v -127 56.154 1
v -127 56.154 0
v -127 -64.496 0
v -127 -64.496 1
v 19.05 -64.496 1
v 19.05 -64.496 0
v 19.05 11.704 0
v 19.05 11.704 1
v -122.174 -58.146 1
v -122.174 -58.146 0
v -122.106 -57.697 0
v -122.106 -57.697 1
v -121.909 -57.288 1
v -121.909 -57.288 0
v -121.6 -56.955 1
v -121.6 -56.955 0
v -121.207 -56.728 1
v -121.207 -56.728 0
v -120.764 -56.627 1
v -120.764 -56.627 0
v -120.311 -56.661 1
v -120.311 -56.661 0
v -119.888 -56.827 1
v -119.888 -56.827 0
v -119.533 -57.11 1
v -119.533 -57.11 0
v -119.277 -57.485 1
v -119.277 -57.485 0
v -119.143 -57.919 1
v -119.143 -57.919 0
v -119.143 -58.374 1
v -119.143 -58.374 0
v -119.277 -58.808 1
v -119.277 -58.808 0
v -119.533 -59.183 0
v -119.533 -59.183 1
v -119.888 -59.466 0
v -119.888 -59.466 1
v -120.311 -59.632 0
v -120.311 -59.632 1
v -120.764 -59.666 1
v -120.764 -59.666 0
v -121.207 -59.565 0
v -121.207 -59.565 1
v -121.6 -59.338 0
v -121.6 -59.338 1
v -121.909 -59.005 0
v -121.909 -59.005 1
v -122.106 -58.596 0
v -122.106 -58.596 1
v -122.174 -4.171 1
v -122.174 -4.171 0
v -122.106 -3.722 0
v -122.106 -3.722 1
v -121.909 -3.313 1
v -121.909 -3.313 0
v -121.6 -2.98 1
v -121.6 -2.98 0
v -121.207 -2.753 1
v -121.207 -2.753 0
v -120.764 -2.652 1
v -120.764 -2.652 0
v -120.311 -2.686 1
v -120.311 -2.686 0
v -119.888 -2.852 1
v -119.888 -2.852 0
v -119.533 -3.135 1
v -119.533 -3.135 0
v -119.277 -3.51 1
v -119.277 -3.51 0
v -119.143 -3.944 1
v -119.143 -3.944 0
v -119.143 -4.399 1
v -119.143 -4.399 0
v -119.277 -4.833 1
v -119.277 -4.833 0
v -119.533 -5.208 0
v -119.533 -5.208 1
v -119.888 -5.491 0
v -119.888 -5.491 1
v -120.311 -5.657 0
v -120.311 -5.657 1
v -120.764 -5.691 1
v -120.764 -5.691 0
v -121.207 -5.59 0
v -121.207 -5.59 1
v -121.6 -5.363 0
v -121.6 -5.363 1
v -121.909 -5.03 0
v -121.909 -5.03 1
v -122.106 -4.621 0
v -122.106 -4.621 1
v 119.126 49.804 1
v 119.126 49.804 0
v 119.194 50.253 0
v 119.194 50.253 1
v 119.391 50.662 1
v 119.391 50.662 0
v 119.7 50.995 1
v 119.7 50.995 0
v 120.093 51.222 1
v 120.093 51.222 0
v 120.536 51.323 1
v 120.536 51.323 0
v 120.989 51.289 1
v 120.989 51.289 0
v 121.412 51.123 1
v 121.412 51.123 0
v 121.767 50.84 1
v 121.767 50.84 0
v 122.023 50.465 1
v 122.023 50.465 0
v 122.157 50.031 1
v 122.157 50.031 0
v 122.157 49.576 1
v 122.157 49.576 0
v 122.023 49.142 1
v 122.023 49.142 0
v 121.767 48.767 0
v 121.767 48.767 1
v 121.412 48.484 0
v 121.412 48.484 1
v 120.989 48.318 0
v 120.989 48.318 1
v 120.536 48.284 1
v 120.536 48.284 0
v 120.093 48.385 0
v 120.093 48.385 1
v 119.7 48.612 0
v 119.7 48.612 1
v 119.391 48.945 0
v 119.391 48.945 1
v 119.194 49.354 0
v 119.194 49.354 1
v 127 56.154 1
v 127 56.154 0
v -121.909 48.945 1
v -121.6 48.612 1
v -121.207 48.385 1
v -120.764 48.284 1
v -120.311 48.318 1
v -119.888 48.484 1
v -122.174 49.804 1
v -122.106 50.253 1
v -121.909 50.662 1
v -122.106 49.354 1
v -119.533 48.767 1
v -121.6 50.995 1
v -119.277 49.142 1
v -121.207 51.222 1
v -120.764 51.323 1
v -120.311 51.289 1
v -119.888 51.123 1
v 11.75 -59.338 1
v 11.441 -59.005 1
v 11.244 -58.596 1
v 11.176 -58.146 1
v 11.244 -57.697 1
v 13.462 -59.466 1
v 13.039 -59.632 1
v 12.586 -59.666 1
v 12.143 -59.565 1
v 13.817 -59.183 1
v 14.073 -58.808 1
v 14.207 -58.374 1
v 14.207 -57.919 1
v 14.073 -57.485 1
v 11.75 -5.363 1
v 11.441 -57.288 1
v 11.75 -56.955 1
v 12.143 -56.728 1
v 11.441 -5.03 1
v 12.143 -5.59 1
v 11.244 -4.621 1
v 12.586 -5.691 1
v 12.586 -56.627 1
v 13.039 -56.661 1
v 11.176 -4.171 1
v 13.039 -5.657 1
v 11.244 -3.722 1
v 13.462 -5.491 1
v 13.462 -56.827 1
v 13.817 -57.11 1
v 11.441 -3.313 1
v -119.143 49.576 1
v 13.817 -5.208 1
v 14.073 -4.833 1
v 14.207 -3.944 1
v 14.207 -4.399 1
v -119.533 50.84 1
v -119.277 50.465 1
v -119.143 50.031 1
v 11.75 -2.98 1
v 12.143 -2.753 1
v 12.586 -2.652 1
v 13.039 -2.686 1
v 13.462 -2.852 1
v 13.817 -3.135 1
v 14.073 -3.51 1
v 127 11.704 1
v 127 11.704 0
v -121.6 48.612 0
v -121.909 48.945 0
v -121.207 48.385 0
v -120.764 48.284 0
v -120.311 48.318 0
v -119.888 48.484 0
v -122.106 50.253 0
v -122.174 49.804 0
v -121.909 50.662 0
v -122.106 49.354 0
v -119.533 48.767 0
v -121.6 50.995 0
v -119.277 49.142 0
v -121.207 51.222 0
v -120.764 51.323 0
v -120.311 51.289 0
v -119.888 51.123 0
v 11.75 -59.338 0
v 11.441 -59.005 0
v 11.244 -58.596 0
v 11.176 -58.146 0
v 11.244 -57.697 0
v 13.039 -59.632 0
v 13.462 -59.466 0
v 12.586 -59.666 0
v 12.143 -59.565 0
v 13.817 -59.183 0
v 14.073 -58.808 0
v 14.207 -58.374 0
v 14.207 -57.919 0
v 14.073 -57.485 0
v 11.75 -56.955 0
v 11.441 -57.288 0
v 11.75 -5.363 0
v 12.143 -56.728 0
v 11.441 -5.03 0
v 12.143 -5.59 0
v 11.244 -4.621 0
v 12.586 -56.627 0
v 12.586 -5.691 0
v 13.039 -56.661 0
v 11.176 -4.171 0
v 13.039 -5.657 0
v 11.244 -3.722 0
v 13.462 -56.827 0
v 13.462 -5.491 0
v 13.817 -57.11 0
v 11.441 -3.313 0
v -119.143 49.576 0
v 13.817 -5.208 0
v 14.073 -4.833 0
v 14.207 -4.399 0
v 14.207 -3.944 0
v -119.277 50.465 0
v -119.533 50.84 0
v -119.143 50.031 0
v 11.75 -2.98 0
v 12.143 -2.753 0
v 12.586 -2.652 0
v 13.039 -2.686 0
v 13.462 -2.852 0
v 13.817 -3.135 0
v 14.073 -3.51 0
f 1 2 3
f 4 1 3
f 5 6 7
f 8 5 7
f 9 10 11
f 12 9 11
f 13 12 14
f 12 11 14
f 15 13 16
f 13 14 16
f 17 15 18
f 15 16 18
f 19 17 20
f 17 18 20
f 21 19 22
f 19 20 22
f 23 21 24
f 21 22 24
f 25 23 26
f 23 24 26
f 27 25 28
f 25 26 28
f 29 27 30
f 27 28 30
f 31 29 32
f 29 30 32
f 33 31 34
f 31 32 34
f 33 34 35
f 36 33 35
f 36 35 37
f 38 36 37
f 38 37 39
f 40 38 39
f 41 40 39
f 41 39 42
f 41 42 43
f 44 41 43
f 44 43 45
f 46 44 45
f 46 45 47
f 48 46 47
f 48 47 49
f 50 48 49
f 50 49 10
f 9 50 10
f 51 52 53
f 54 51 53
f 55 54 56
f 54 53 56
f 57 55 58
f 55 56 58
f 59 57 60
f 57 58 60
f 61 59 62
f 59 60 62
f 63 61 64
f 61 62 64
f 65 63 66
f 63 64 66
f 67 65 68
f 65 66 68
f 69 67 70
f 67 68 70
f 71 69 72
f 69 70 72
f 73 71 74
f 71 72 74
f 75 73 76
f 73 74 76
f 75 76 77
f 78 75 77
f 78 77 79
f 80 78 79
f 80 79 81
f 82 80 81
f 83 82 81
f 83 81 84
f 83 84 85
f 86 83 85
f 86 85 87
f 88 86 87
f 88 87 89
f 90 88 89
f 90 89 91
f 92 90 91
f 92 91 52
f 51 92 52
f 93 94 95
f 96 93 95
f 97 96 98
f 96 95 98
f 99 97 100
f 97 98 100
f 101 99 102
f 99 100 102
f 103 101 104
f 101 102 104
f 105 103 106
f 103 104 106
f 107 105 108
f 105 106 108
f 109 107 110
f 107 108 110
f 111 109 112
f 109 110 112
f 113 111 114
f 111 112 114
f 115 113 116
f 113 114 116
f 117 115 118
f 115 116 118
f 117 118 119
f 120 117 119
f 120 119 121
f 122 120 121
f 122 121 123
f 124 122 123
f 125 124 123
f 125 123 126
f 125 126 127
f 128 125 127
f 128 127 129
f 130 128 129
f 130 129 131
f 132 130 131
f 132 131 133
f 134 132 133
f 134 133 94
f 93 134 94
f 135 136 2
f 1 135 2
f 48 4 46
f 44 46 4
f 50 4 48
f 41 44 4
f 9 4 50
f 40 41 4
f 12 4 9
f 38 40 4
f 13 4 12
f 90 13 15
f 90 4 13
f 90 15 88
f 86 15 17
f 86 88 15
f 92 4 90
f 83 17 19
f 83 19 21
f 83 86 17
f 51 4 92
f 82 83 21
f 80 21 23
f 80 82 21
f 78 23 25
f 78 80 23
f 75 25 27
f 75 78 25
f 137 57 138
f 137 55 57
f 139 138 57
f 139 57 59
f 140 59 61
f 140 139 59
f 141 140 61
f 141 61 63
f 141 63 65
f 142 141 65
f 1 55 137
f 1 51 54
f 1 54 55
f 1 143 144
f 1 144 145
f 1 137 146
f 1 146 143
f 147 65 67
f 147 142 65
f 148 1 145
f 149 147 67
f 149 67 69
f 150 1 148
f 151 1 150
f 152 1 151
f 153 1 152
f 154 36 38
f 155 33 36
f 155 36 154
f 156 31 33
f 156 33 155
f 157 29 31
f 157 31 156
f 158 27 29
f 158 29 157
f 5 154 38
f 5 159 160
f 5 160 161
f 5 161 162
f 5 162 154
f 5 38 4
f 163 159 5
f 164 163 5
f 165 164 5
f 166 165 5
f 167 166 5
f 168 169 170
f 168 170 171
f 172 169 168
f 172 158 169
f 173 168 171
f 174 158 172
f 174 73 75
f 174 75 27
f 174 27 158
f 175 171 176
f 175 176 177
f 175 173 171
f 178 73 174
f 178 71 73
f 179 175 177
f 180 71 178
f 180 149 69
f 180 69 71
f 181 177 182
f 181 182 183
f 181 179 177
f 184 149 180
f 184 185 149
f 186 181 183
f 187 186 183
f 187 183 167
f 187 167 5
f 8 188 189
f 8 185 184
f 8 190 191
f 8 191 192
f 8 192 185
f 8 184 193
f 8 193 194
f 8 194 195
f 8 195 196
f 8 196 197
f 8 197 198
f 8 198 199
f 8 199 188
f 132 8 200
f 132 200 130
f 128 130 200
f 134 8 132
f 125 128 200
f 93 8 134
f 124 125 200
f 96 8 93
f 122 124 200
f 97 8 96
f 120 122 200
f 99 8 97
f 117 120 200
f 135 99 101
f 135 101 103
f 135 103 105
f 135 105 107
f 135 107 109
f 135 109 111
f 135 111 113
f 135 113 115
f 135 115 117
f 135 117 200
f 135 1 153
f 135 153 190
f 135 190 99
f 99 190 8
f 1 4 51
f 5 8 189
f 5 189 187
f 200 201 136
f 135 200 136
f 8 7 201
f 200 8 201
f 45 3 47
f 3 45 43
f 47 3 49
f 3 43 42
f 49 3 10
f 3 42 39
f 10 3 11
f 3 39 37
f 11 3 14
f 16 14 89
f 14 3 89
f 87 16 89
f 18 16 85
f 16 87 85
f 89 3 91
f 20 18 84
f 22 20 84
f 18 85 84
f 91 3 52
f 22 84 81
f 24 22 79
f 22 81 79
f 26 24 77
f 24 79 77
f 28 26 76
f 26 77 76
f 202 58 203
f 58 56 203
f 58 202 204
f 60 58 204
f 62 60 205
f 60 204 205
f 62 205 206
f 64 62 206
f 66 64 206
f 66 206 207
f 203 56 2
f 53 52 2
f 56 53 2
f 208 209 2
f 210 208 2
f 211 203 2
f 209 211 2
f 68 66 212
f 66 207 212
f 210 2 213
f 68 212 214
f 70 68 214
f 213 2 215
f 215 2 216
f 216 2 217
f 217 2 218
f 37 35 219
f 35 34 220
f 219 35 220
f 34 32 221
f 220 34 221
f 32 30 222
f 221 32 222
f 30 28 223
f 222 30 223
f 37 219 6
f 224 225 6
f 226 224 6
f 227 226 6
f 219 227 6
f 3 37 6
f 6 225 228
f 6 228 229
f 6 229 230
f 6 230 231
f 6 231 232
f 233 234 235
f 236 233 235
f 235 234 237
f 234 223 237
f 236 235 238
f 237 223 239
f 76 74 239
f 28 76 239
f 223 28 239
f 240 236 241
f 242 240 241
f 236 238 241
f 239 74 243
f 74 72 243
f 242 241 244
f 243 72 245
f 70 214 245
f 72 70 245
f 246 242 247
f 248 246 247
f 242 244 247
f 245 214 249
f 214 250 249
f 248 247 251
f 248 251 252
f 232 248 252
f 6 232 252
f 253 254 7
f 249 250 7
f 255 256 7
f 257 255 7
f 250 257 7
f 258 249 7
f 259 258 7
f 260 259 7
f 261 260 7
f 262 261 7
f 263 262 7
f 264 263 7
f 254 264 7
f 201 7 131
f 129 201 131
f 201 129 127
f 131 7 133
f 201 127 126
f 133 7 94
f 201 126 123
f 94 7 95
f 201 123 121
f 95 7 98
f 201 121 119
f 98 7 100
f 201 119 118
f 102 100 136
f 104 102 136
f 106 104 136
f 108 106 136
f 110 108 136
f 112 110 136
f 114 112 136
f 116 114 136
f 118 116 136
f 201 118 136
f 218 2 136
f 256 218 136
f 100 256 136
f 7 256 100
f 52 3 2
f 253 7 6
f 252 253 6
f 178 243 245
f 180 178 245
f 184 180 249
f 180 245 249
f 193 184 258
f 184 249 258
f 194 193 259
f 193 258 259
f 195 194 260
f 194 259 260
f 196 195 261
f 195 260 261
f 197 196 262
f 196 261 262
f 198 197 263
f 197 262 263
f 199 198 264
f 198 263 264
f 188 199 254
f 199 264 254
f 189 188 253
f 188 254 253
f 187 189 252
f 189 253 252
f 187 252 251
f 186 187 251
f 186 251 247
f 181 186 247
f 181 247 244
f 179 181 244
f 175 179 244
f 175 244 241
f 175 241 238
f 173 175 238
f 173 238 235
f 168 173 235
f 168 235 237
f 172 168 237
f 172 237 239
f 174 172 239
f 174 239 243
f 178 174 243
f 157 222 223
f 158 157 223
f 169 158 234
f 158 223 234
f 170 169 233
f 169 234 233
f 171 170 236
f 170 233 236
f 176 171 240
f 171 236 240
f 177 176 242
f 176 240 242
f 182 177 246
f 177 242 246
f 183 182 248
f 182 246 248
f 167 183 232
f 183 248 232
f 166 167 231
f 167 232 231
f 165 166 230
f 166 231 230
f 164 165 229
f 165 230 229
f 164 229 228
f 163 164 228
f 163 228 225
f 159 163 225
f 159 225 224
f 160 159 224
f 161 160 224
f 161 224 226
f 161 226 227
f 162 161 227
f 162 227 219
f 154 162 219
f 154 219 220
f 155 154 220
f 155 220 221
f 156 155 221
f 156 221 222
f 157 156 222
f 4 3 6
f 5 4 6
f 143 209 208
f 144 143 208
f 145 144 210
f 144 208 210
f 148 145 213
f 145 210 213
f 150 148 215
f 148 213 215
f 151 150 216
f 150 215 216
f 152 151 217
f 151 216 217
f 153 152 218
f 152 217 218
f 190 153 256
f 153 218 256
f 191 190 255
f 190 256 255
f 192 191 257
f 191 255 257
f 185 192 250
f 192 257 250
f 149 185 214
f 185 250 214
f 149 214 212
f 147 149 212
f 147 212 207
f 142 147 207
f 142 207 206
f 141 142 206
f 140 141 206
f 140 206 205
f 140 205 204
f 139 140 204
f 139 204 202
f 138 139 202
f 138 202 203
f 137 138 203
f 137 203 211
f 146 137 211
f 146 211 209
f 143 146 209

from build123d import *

# Parameters (mm, degrees)
F1_DEPTH = 1
F3_D     = 3.048
F3_DEPTH = 12.7
F3_TIP   = 0.9157115834


# Not quite as in the source:
# - a feature names something its author has since deleted; it is built from what else it names


with BuildPart() as f1:
    # F0 (on Top) → F1 (new body)
    with BuildSketch(Plane.XY):
        Polygon((127, 56.1535057819), (-127, 56.1535057819), (-127, 11.7035057819), (-127, -64.4964942181), (19.05, -64.4964942181), (19.05, 11.7035057819), (127, 11.7035057819), align=None)
    extrude(amount=F1_DEPTH)

    # F3
    with Locations(Plane.XY.offset(1)):
        with Locations((-120.65, 49.8035057819), (-120.65, -4.1714942181), (-120.65, -58.1464942181), (12.7, -58.1464942181), (12.7, -4.1714942181), (120.65, 49.8035057819)):
            Hole(F3_D / 2, depth=F3_DEPTH)
            with Locations((0, 0, -(F3_DEPTH + F3_TIP / 2))):  # 118° drill point
                Cone(0, F3_D / 2, F3_TIP, mode=Mode.SUBTRACT)


solid = f1.part
